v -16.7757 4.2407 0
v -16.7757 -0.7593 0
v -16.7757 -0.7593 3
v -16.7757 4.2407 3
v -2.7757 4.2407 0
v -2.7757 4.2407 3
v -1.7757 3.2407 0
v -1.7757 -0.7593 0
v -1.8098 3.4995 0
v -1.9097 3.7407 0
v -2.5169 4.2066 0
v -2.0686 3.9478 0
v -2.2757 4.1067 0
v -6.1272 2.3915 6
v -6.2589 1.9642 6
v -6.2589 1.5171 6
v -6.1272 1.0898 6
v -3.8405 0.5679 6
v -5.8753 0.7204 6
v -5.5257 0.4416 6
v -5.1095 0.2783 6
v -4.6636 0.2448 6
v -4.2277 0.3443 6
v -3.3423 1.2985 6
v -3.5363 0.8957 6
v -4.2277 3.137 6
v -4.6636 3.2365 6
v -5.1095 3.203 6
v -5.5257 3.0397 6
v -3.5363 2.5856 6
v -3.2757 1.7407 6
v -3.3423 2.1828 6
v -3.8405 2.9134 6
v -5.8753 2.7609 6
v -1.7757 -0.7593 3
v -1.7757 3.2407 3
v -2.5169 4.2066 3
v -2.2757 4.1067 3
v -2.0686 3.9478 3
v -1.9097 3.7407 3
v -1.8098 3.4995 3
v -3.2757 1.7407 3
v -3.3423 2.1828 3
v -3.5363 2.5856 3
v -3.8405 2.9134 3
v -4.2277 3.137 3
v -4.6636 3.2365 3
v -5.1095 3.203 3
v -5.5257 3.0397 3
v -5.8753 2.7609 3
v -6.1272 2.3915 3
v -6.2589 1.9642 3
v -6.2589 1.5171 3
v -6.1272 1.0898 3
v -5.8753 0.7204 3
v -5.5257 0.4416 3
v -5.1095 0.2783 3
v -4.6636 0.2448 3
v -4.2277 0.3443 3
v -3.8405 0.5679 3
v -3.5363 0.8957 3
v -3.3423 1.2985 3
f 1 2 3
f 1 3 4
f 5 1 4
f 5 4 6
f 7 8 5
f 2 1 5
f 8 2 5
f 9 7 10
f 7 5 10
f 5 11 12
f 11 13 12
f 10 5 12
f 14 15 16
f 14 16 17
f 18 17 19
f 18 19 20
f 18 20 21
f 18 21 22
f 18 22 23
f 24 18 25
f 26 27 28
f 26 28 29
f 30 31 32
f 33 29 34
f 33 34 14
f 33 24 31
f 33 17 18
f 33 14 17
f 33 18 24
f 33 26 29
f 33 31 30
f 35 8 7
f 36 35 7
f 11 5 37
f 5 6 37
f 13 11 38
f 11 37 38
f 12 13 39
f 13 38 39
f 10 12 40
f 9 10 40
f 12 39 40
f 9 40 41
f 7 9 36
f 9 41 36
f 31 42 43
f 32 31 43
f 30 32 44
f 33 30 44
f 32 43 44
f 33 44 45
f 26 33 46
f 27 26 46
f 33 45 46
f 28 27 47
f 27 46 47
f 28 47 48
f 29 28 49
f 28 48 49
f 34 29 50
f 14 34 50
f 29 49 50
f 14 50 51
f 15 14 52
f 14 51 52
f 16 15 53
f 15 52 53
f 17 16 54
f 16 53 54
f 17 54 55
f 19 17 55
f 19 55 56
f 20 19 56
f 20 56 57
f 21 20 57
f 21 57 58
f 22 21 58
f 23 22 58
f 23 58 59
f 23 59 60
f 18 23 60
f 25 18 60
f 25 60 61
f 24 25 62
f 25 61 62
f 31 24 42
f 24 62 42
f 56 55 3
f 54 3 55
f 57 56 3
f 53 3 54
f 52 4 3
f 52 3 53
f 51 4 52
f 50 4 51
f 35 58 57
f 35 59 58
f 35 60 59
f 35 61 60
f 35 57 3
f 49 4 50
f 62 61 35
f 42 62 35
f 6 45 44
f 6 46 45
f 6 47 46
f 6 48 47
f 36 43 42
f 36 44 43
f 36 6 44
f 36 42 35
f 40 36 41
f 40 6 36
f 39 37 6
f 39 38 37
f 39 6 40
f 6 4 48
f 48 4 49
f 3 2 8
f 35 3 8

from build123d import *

# Parameters (mm, degrees)
SKETCH_1_W      = 15
SKETCH_1_H      = 5
EXTRUDE_1_DEPTH = 3
SKETCH_2_R      = 1.5
EXTRUDE_2_DEPTH = 3
FILLET_2_R      = 1


with BuildPart() as part:
    # 草图1 → 凸台-拉伸1 (new body)
    with BuildSketch(Plane.XY):
        with Locations((-9.275700935, 1.740654206)):
            Rectangle(SKETCH_1_W, SKETCH_1_H)
    extrude(amount=EXTRUDE_1_DEPTH)

    # 草图2 → 凸台-拉伸2 (add)
    with BuildSketch(Plane.XY.offset(3)):
        with Locations((-4.775700935, 1.740654206)):
            Circle(SKETCH_2_R)
    extrude(amount=EXTRUDE_2_DEPTH)

    # 圆角2
    fillet_2_edges = [part.edges().sort_by_distance(p)[0] for p in [
        (-1.775700935, 4.240654206, 1.5),
    ]]
    fillet(fillet_2_edges, radius=FILLET_2_R)


solid = part.part
